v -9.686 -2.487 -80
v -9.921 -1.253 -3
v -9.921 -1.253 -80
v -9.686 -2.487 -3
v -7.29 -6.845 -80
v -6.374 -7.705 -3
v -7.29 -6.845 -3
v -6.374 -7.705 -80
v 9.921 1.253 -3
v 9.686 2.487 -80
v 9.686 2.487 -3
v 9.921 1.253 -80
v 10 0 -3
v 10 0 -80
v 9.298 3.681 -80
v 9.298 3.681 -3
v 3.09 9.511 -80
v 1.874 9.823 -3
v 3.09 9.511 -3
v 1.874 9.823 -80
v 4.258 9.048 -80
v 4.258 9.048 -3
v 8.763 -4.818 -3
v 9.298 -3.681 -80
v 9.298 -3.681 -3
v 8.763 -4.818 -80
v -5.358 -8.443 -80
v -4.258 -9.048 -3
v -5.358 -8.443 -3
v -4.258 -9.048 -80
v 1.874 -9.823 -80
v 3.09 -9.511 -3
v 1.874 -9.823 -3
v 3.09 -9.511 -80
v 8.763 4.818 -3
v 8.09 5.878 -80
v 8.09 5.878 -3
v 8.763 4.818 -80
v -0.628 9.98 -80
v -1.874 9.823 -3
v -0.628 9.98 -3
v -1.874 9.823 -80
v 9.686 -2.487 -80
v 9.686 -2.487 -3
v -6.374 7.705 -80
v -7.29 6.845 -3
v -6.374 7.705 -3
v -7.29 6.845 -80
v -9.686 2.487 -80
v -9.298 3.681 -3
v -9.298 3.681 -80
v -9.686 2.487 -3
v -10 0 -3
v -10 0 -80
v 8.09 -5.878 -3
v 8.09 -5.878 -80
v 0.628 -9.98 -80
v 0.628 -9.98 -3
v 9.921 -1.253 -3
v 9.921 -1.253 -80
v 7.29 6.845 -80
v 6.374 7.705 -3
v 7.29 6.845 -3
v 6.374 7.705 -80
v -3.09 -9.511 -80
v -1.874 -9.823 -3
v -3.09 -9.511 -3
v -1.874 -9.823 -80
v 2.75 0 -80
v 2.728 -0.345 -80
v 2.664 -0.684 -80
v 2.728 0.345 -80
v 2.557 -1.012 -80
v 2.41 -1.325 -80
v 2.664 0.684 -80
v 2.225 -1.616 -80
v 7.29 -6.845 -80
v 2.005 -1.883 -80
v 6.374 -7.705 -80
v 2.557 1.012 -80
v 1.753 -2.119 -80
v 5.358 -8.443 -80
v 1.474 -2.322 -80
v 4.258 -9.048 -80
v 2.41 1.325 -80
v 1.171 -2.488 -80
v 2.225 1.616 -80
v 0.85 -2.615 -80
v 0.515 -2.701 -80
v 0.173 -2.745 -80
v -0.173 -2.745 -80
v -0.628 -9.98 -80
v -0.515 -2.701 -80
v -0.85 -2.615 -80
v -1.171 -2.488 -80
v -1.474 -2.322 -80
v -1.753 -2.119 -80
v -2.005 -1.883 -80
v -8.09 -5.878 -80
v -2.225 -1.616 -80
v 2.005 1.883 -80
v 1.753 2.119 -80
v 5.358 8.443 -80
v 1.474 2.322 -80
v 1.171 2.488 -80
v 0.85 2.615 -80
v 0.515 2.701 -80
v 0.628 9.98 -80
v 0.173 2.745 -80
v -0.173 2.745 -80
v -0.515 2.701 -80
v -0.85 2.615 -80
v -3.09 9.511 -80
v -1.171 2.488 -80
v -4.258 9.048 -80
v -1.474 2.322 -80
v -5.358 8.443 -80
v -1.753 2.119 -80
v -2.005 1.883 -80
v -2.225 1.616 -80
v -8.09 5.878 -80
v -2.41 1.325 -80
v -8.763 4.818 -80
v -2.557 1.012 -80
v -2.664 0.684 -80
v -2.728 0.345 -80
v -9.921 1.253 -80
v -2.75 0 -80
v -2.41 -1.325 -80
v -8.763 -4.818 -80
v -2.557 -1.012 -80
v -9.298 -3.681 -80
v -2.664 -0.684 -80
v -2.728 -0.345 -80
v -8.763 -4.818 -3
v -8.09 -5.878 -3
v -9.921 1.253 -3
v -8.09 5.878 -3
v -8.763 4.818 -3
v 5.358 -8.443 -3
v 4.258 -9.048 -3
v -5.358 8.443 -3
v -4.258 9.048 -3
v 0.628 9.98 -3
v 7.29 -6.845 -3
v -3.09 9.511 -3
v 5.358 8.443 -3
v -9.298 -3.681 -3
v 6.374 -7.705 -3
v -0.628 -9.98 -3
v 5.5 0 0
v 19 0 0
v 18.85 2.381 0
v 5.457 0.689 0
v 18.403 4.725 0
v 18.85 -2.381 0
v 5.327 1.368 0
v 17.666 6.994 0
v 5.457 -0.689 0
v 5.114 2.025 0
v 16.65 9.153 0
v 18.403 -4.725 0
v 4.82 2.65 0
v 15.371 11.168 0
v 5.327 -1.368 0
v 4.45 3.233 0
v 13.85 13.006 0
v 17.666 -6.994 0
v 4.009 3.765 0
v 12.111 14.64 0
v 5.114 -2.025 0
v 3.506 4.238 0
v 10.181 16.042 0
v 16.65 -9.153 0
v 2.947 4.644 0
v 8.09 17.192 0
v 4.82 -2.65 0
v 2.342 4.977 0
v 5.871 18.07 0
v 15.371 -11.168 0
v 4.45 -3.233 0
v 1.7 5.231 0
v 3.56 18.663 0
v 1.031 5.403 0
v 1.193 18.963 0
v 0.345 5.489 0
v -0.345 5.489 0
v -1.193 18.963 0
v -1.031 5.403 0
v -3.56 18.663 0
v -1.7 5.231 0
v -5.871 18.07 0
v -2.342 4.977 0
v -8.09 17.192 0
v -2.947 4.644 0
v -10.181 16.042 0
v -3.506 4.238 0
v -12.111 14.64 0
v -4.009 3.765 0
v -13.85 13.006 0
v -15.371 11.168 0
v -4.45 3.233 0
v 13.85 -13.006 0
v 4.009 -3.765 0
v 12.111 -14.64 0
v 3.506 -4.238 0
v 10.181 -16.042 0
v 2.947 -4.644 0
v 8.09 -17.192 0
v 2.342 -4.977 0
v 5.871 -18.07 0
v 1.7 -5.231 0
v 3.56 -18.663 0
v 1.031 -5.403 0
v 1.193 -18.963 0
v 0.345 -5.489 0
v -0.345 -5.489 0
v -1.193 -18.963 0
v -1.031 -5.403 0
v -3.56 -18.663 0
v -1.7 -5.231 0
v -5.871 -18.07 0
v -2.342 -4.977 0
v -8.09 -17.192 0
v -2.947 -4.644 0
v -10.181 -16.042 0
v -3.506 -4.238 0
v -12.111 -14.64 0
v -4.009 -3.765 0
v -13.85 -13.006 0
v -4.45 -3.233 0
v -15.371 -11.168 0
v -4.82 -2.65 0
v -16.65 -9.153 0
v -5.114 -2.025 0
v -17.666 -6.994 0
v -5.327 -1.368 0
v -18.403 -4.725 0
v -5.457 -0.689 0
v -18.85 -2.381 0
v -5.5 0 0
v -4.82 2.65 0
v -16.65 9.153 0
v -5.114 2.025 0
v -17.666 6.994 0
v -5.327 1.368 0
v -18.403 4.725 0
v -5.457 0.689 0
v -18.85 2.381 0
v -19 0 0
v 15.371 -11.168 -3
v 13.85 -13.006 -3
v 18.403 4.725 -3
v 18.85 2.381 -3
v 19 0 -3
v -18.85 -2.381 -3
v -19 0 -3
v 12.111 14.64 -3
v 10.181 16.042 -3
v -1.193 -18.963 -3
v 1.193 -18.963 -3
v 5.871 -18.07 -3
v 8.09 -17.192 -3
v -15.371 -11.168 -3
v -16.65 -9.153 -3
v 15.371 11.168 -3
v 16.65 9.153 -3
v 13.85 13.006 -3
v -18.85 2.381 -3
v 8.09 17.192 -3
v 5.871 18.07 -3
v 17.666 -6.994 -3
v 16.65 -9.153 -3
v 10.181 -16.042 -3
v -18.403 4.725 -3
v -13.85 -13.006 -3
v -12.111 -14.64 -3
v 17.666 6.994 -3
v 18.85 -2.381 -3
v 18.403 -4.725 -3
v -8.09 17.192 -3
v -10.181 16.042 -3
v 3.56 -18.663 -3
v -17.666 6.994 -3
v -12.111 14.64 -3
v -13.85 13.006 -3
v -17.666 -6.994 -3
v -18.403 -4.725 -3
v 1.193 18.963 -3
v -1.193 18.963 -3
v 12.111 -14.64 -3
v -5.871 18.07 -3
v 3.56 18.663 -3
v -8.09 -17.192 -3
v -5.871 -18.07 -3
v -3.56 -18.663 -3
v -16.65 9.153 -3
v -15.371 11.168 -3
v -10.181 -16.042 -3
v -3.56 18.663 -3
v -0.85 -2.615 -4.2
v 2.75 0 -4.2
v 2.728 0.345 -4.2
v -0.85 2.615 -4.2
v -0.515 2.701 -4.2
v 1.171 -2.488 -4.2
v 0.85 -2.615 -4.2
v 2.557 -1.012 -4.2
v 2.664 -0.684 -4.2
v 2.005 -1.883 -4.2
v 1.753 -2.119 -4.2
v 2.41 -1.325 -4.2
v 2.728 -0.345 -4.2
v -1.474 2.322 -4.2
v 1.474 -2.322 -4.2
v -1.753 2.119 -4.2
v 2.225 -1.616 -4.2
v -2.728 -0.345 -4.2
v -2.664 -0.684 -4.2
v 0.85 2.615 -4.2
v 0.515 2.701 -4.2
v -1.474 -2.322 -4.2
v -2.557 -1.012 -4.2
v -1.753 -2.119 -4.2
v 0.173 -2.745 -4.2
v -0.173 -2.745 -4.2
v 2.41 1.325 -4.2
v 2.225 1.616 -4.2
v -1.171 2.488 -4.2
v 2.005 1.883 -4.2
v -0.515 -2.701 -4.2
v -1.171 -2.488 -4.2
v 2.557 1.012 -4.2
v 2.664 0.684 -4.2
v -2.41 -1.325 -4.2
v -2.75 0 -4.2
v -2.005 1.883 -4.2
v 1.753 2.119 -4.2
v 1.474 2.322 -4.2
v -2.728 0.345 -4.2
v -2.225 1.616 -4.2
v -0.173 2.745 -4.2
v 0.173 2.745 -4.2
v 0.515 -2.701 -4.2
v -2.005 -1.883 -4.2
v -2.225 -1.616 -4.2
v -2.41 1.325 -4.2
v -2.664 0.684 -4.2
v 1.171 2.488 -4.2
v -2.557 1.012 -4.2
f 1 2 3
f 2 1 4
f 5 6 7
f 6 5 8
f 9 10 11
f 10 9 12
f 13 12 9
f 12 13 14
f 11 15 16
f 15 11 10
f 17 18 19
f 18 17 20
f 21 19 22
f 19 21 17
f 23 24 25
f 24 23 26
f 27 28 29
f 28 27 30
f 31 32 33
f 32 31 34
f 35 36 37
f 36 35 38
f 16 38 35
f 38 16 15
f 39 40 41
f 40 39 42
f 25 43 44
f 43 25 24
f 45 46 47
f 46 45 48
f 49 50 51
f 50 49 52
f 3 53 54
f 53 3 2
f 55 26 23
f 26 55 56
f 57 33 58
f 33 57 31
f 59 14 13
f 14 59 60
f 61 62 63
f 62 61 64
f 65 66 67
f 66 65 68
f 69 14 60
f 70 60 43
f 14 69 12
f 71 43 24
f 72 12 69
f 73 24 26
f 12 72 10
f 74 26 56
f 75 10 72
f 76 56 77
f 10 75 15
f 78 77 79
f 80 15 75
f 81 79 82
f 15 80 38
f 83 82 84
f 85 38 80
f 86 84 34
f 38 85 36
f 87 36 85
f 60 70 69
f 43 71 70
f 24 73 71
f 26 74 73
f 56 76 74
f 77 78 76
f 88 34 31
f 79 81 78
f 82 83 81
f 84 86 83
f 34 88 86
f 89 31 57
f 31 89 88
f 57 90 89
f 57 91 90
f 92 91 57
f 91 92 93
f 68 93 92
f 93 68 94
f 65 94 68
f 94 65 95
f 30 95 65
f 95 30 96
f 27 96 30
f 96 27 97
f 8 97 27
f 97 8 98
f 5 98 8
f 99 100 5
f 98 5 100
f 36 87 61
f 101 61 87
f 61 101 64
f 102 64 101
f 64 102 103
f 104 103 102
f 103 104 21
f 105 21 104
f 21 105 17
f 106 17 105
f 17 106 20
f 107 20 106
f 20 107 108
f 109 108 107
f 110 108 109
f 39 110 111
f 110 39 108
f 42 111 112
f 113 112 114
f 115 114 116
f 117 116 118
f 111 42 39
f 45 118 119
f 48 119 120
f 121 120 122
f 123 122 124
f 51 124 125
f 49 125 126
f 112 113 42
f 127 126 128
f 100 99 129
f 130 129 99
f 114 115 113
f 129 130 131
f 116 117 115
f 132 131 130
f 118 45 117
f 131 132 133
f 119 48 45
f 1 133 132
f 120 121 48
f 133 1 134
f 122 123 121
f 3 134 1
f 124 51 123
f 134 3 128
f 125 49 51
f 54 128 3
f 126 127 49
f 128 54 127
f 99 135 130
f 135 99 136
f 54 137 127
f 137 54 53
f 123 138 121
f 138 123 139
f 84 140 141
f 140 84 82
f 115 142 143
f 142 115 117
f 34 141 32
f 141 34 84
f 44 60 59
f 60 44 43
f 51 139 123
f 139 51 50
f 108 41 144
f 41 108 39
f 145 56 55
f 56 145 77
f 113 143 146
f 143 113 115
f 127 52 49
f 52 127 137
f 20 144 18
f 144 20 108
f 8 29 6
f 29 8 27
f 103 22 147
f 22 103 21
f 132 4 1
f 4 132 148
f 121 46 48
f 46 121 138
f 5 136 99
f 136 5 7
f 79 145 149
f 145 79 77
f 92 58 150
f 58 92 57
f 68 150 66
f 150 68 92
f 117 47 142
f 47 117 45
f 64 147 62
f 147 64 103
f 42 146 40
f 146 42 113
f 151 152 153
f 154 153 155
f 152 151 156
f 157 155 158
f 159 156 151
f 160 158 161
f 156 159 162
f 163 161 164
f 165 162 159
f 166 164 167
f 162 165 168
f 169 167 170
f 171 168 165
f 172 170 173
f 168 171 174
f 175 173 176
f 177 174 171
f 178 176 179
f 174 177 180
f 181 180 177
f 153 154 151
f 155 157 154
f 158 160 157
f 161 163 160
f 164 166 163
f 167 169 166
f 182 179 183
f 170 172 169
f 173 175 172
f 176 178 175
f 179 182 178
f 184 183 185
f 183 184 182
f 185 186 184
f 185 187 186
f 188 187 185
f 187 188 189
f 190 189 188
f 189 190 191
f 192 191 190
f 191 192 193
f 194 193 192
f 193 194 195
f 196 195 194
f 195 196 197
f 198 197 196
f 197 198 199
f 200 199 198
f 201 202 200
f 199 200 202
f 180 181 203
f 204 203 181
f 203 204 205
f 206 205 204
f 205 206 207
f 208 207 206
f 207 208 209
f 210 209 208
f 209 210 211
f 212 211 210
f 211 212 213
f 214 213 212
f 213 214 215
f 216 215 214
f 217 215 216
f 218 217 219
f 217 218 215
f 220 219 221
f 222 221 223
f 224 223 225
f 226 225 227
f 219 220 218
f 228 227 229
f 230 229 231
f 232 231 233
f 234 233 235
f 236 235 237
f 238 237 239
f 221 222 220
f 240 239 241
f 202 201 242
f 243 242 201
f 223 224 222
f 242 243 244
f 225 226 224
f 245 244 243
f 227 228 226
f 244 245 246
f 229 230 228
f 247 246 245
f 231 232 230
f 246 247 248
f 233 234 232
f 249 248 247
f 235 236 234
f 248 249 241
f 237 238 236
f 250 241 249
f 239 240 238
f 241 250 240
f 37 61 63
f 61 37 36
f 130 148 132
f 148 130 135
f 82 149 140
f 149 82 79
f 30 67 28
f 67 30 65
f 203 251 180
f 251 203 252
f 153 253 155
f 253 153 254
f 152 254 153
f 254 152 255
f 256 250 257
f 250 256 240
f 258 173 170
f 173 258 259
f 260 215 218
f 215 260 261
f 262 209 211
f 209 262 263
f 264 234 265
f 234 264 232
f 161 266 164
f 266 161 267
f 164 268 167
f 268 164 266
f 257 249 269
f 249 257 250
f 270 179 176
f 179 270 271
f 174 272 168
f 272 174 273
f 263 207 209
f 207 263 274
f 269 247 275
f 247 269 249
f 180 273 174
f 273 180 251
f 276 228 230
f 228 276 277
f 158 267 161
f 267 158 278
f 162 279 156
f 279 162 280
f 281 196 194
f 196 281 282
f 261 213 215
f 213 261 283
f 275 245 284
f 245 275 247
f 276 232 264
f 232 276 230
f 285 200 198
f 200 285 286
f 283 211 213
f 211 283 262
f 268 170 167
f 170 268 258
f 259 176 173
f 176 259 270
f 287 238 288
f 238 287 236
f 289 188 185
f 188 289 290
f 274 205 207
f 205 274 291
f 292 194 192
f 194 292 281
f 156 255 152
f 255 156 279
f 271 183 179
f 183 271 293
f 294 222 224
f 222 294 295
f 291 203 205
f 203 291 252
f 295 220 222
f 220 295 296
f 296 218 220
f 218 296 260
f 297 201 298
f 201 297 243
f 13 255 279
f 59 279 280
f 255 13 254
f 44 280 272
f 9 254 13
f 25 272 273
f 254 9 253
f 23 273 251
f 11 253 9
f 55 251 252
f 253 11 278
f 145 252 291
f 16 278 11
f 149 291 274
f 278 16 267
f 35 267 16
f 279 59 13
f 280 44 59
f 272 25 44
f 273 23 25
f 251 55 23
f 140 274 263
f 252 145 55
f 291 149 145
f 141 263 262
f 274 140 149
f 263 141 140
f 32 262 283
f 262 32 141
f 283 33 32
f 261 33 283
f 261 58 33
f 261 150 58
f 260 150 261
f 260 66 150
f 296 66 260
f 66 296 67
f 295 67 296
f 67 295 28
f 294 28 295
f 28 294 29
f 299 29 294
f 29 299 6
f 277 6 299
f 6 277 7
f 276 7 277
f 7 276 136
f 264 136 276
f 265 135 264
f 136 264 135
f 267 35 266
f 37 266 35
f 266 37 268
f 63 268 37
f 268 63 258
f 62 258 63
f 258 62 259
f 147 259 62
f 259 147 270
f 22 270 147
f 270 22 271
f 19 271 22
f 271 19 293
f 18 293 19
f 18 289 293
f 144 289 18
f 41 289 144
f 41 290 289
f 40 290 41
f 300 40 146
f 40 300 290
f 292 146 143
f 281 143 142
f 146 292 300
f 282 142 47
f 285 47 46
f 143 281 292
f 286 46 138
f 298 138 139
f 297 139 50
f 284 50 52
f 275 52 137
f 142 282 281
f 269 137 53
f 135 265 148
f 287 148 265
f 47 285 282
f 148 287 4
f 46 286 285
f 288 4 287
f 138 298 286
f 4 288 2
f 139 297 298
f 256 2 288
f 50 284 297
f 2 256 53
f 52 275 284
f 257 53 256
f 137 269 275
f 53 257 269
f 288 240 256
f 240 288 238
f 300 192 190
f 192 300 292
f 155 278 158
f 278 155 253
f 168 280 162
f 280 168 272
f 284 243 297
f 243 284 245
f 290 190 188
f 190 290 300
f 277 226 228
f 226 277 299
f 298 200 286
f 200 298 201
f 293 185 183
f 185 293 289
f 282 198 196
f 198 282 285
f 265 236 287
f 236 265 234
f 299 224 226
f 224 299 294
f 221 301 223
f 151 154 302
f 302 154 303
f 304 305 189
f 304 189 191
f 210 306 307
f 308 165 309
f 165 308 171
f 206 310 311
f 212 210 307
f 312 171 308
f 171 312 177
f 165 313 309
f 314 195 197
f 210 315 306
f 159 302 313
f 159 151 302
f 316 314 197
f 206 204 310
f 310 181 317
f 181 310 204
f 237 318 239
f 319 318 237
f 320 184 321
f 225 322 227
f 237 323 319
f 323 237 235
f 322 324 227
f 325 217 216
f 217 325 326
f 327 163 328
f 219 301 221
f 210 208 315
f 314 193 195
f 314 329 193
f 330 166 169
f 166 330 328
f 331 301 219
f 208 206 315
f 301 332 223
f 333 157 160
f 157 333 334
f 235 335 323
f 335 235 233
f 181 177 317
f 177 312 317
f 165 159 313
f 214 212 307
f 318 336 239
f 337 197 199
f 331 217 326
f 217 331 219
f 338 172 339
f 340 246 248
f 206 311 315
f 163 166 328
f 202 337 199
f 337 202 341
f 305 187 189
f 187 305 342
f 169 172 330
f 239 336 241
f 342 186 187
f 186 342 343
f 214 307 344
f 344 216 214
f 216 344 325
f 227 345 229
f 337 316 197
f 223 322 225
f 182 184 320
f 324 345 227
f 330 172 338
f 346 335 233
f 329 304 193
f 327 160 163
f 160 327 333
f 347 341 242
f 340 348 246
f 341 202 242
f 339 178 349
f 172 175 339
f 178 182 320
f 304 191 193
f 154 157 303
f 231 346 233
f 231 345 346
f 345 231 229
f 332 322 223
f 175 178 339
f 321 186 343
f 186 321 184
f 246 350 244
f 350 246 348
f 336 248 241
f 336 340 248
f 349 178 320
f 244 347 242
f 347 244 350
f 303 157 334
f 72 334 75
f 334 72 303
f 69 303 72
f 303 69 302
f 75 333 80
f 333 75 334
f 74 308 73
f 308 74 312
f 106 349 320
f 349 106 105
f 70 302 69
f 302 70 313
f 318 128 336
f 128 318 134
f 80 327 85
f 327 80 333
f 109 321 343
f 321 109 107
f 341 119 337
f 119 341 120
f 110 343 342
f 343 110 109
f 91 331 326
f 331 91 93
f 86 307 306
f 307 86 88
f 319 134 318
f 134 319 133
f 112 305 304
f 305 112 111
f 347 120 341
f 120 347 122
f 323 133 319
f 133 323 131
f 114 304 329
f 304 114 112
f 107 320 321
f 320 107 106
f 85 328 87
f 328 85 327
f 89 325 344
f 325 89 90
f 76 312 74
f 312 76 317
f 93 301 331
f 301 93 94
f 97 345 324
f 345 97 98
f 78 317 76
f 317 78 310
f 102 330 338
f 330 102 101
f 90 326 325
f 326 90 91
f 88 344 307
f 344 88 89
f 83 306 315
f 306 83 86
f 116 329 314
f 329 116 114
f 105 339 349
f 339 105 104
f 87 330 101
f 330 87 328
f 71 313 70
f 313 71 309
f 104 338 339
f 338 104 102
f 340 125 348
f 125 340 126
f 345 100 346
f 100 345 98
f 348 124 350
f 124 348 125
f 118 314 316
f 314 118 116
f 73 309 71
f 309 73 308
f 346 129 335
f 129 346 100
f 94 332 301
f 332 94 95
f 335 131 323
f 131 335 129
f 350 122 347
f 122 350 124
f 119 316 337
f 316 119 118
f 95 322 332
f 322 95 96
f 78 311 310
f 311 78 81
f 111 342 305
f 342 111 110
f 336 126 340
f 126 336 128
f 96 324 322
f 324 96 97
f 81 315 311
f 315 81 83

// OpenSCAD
$fn = 50;


difference() {
	union() {
		translate(v = [0, 0, -80.0000000000]) {
			cylinder(h = 80, r = 10.0000000000);
		}
		translate(v = [0, 0, -3.0000000000]) {
			cylinder(h = 3, r = 19.0000000000);
		}
	}
	union() {
		translate(v = [0, 0, 0]) {
			rotate(a = [0, 0, 0]) {
				difference() {
					union() {
						#translate(v = [0, 0, -80.0000000000]) {
							cylinder(h = 80, r = 2.2500000000);
						}
						#translate(v = [0, 0, -4.2000000000]) {
							cylinder(h = 4.2000000000, r = 10.0000000000, r1 = 2.7500000000, r2 = 5.5000000000);
						}
						#translate(v = [0, 0, -80.0000000000]) {
							cylinder(h = 80, r = 2.7500000000);
						}
						#translate(v = [0, 0, -80.0000000000]) {
							cylinder(h = 80, r = 2.2500000000);
						}
					}
					union();
				}
			}
		}
	}
}
